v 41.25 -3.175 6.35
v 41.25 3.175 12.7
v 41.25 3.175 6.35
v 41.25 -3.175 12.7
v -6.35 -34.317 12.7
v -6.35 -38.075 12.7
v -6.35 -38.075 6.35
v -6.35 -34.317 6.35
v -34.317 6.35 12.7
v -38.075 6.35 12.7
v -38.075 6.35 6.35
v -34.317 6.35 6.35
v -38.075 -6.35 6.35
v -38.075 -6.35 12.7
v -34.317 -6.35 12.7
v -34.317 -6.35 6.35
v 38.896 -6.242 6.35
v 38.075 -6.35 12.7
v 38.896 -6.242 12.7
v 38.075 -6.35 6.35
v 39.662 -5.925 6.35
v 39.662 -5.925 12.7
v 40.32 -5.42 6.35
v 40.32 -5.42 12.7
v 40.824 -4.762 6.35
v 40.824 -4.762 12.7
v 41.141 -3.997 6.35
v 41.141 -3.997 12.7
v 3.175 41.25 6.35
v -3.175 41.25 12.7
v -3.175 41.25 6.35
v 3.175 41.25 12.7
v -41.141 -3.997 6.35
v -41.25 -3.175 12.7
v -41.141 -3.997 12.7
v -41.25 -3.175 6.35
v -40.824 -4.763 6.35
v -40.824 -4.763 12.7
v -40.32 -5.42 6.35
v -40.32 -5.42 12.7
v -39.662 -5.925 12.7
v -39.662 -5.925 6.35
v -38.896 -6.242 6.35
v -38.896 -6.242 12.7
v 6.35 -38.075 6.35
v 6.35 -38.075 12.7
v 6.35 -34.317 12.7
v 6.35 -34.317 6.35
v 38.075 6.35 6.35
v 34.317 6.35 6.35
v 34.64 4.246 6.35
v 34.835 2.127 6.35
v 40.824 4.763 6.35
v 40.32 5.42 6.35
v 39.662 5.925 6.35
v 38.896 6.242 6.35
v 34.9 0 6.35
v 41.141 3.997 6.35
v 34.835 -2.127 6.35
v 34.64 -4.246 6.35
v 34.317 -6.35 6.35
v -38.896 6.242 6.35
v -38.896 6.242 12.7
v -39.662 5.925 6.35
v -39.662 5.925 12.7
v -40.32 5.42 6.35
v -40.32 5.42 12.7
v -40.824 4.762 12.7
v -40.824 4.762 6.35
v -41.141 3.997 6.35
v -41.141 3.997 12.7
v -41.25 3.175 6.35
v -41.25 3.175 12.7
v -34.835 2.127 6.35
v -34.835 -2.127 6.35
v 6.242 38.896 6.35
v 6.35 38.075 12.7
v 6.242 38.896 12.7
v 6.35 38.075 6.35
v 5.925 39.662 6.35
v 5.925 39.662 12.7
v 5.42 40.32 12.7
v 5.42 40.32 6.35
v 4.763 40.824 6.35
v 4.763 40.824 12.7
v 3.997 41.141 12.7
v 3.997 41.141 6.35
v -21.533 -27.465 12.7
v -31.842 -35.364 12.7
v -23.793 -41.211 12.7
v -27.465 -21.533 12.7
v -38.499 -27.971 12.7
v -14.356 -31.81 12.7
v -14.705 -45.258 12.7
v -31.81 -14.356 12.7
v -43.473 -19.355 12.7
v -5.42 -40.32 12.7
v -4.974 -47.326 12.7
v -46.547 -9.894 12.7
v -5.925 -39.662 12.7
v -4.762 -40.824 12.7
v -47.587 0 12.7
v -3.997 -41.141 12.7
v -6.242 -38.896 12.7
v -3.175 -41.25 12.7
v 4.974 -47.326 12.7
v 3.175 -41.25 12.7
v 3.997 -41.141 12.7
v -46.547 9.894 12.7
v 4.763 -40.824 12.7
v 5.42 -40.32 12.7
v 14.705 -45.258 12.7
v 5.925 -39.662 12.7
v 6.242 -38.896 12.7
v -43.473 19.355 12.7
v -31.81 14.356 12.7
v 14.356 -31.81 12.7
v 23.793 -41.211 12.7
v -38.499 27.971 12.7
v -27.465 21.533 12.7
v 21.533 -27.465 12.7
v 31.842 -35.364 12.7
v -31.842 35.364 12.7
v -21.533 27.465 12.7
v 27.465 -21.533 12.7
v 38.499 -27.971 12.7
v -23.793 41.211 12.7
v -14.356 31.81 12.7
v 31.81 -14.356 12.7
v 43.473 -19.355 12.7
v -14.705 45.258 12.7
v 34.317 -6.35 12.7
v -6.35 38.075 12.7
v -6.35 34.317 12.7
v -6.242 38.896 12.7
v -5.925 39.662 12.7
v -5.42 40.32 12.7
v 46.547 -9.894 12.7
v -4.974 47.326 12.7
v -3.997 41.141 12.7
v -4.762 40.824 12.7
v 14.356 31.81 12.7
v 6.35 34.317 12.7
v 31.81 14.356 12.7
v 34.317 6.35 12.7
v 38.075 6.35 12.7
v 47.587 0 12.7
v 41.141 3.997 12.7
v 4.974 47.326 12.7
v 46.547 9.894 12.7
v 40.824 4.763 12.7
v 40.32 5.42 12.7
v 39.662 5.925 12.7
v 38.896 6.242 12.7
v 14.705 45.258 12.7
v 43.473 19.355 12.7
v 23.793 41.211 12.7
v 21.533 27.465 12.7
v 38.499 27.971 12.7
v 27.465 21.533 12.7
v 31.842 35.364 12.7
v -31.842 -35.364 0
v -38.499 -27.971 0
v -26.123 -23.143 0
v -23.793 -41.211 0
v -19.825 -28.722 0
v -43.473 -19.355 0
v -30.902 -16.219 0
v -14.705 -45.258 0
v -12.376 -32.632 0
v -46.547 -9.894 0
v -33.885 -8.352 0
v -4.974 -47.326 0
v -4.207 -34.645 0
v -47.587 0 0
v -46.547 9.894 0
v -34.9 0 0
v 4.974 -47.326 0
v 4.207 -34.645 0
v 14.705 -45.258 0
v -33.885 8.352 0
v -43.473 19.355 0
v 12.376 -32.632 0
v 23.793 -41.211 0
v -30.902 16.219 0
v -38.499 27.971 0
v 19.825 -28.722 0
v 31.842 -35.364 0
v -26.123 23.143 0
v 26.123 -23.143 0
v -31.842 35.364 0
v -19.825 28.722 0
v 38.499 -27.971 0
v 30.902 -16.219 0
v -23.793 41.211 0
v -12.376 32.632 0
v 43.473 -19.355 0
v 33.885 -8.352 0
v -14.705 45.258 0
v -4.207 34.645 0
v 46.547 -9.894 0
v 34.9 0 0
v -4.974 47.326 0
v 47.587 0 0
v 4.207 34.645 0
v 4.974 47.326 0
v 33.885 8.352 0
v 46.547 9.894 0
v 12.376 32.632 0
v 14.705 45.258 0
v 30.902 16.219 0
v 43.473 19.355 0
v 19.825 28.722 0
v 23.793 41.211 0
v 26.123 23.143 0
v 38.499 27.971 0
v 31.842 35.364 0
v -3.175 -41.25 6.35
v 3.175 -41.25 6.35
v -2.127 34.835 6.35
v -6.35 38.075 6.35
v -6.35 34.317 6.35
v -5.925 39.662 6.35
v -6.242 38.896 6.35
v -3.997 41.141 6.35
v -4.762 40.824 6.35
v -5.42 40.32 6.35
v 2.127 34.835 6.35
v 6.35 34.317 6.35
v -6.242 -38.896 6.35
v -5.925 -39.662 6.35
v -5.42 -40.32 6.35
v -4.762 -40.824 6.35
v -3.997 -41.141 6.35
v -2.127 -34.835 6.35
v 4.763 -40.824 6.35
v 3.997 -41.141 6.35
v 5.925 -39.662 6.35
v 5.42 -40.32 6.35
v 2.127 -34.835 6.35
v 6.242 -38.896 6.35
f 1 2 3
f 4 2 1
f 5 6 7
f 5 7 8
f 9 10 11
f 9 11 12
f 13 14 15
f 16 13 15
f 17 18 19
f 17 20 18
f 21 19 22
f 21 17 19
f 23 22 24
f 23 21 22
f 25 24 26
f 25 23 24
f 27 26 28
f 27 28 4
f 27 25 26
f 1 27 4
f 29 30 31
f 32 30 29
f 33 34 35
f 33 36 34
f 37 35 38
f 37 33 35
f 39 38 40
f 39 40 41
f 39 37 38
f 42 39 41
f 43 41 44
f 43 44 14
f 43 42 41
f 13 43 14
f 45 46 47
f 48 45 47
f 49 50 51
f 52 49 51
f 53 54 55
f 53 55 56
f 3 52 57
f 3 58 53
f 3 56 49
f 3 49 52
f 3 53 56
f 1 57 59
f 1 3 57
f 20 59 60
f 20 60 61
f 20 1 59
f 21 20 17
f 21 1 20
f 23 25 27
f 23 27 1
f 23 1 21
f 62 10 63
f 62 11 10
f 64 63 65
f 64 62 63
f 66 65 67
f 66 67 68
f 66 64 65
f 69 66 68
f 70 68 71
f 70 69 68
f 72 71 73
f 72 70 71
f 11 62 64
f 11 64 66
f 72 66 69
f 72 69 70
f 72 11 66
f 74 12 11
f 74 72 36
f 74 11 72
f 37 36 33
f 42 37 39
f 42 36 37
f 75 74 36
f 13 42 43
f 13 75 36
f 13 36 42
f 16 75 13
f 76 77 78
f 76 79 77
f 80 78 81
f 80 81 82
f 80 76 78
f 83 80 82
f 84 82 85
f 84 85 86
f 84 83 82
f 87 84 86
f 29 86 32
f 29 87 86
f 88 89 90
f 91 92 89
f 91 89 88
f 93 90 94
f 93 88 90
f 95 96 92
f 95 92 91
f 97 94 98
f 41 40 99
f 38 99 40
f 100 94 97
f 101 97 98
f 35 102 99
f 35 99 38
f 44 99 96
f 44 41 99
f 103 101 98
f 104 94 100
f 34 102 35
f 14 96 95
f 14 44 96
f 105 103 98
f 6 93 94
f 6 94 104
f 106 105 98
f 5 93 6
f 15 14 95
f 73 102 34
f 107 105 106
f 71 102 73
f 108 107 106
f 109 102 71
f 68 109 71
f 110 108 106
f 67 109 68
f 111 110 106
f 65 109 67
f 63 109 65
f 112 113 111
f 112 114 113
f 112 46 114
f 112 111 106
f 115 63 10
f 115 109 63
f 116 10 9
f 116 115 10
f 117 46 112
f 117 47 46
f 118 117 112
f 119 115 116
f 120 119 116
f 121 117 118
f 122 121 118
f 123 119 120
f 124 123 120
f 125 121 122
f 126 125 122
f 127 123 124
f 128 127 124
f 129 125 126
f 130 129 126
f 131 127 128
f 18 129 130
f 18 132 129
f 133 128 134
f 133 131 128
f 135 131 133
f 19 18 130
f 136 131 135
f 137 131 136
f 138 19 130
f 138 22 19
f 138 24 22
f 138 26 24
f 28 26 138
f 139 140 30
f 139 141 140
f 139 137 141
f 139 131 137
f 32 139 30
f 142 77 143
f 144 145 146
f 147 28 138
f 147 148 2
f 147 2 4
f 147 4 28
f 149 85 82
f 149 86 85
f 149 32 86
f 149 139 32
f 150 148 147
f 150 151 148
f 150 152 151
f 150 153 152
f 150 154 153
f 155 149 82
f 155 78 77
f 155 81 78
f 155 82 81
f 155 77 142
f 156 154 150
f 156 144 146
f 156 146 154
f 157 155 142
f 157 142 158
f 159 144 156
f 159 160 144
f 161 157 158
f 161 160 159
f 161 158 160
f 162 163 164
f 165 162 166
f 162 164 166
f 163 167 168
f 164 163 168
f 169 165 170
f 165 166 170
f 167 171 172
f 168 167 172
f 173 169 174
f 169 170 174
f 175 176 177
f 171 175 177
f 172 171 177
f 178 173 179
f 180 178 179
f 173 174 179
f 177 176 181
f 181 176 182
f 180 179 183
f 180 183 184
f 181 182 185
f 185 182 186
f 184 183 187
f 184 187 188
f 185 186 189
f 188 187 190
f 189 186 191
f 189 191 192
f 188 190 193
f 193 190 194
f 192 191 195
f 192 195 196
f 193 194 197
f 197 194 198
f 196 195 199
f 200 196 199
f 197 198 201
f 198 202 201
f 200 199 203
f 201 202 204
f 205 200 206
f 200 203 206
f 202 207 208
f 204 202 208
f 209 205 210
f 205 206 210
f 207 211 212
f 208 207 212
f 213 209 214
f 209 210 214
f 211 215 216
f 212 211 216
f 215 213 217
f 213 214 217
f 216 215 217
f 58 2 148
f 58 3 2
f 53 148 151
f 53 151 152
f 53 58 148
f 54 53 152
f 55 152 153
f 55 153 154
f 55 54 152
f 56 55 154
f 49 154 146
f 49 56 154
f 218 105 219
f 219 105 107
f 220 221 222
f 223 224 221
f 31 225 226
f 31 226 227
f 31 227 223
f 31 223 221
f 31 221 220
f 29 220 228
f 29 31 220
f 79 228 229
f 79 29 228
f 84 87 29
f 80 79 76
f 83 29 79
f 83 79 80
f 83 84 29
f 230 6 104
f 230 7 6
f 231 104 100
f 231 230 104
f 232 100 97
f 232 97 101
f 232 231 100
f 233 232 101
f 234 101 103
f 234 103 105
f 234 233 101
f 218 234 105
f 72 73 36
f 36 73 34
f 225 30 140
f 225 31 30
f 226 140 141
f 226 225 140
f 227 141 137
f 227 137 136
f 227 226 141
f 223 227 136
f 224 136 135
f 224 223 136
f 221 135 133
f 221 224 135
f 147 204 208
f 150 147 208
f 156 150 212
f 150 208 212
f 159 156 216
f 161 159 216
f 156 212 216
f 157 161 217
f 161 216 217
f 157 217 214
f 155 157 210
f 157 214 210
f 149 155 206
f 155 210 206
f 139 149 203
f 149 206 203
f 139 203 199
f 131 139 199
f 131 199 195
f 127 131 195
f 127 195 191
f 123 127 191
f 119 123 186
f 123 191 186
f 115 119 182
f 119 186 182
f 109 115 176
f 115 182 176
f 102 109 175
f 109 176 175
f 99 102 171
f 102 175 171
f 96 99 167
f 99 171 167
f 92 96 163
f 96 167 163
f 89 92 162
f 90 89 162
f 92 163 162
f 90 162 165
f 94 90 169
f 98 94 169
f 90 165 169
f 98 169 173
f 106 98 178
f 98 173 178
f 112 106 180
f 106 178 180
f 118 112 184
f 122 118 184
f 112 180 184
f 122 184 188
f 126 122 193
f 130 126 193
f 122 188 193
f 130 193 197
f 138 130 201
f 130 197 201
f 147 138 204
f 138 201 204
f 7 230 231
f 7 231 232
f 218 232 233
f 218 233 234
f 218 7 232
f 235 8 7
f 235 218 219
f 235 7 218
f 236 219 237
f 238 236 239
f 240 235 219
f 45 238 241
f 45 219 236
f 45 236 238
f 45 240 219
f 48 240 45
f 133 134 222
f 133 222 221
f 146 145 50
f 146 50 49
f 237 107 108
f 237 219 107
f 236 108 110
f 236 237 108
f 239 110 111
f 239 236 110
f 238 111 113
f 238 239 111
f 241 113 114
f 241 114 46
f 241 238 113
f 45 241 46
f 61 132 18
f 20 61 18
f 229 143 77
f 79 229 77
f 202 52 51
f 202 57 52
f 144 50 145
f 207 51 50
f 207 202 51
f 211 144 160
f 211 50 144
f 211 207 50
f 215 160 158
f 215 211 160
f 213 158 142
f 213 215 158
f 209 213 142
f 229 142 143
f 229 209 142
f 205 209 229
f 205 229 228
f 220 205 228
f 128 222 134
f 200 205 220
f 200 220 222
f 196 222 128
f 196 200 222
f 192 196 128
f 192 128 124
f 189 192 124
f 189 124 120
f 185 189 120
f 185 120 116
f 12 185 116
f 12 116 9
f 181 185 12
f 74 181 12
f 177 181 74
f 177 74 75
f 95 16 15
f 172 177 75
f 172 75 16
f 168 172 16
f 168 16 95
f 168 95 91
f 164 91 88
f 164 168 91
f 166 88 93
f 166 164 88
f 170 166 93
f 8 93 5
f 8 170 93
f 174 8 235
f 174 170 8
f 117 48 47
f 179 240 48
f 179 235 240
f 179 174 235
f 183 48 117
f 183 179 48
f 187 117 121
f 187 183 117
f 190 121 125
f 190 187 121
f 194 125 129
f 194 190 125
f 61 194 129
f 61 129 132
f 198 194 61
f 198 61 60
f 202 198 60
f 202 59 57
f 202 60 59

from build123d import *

# Parameters (mm, degrees)
SKETCH1_R                = 47.5869
SKETCH1_R_2              = 34.8996
BOSS_EXTRUDE1_DEPTH      = 12.7
SKETCH2_W                = 12.7
SKETCH2_H                = 82.4992
CUT_EXTRUDE1_DEPTH       = 6.35
FILLET1_R                = 3.175
CIRPATTERN1_COUNT        = 2
CIRPATTERN1_ANGLE        = 90
FILLET1_OF_CIRPATTERN1_R = 3.175


with BuildPart() as part:
    # Sketch1 → Boss-Extrude1 (new body)
    with BuildSketch(Plane.XY):
        Circle(SKETCH1_R)
        Circle(SKETCH1_R_2, mode=Mode.SUBTRACT)
    extrude(amount=BOSS_EXTRUDE1_DEPTH)

    # Sketch2 → Cut-Extrude1 (cut)
    with BuildSketch(Plane.XY.offset(12.7)):
        Rectangle(SKETCH2_W, SKETCH2_H)
    cut_extrude1 = extrude(amount=-CUT_EXTRUDE1_DEPTH, mode=Mode.SUBTRACT)

    # Fillet1
    fillet1_edges = [part.edges().sort_by_distance(p)[0] for p in [
        (6.35, 41.2496, 9.525),
        (6.35, -41.2496, 9.525),
        (-6.35, -41.2496, 9.525),
        (-6.35, 41.2496, 9.525),
    ]]
    fillet(fillet1_edges, radius=FILLET1_R)

    # CirPattern1: Cut-Extrude1 ×2 about axis
    cirpattern1_axis = Axis((0, 0, 0), (0, 0, -1))
    for i in range(1, CIRPATTERN1_COUNT):
        add(cut_extrude1.rotate(cirpattern1_axis, i * CIRPATTERN1_ANGLE / (CIRPATTERN1_COUNT - 1)), mode=Mode.SUBTRACT)

    # Fillet1 of CirPattern1
    fillet1_of_cirpattern1_edges = [part.edges().sort_by_distance(p)[0] for p in [
        (41.2496, -6.35, 9.525),
        (-41.2496, -6.35, 9.525),
        (-41.2496, 6.35, 9.525),
        (41.2496, 6.35, 9.525),
    ]]
    fillet(fillet1_of_cirpattern1_edges, radius=FILLET1_OF_CIRPATTERN1_R)


solid = part.part
